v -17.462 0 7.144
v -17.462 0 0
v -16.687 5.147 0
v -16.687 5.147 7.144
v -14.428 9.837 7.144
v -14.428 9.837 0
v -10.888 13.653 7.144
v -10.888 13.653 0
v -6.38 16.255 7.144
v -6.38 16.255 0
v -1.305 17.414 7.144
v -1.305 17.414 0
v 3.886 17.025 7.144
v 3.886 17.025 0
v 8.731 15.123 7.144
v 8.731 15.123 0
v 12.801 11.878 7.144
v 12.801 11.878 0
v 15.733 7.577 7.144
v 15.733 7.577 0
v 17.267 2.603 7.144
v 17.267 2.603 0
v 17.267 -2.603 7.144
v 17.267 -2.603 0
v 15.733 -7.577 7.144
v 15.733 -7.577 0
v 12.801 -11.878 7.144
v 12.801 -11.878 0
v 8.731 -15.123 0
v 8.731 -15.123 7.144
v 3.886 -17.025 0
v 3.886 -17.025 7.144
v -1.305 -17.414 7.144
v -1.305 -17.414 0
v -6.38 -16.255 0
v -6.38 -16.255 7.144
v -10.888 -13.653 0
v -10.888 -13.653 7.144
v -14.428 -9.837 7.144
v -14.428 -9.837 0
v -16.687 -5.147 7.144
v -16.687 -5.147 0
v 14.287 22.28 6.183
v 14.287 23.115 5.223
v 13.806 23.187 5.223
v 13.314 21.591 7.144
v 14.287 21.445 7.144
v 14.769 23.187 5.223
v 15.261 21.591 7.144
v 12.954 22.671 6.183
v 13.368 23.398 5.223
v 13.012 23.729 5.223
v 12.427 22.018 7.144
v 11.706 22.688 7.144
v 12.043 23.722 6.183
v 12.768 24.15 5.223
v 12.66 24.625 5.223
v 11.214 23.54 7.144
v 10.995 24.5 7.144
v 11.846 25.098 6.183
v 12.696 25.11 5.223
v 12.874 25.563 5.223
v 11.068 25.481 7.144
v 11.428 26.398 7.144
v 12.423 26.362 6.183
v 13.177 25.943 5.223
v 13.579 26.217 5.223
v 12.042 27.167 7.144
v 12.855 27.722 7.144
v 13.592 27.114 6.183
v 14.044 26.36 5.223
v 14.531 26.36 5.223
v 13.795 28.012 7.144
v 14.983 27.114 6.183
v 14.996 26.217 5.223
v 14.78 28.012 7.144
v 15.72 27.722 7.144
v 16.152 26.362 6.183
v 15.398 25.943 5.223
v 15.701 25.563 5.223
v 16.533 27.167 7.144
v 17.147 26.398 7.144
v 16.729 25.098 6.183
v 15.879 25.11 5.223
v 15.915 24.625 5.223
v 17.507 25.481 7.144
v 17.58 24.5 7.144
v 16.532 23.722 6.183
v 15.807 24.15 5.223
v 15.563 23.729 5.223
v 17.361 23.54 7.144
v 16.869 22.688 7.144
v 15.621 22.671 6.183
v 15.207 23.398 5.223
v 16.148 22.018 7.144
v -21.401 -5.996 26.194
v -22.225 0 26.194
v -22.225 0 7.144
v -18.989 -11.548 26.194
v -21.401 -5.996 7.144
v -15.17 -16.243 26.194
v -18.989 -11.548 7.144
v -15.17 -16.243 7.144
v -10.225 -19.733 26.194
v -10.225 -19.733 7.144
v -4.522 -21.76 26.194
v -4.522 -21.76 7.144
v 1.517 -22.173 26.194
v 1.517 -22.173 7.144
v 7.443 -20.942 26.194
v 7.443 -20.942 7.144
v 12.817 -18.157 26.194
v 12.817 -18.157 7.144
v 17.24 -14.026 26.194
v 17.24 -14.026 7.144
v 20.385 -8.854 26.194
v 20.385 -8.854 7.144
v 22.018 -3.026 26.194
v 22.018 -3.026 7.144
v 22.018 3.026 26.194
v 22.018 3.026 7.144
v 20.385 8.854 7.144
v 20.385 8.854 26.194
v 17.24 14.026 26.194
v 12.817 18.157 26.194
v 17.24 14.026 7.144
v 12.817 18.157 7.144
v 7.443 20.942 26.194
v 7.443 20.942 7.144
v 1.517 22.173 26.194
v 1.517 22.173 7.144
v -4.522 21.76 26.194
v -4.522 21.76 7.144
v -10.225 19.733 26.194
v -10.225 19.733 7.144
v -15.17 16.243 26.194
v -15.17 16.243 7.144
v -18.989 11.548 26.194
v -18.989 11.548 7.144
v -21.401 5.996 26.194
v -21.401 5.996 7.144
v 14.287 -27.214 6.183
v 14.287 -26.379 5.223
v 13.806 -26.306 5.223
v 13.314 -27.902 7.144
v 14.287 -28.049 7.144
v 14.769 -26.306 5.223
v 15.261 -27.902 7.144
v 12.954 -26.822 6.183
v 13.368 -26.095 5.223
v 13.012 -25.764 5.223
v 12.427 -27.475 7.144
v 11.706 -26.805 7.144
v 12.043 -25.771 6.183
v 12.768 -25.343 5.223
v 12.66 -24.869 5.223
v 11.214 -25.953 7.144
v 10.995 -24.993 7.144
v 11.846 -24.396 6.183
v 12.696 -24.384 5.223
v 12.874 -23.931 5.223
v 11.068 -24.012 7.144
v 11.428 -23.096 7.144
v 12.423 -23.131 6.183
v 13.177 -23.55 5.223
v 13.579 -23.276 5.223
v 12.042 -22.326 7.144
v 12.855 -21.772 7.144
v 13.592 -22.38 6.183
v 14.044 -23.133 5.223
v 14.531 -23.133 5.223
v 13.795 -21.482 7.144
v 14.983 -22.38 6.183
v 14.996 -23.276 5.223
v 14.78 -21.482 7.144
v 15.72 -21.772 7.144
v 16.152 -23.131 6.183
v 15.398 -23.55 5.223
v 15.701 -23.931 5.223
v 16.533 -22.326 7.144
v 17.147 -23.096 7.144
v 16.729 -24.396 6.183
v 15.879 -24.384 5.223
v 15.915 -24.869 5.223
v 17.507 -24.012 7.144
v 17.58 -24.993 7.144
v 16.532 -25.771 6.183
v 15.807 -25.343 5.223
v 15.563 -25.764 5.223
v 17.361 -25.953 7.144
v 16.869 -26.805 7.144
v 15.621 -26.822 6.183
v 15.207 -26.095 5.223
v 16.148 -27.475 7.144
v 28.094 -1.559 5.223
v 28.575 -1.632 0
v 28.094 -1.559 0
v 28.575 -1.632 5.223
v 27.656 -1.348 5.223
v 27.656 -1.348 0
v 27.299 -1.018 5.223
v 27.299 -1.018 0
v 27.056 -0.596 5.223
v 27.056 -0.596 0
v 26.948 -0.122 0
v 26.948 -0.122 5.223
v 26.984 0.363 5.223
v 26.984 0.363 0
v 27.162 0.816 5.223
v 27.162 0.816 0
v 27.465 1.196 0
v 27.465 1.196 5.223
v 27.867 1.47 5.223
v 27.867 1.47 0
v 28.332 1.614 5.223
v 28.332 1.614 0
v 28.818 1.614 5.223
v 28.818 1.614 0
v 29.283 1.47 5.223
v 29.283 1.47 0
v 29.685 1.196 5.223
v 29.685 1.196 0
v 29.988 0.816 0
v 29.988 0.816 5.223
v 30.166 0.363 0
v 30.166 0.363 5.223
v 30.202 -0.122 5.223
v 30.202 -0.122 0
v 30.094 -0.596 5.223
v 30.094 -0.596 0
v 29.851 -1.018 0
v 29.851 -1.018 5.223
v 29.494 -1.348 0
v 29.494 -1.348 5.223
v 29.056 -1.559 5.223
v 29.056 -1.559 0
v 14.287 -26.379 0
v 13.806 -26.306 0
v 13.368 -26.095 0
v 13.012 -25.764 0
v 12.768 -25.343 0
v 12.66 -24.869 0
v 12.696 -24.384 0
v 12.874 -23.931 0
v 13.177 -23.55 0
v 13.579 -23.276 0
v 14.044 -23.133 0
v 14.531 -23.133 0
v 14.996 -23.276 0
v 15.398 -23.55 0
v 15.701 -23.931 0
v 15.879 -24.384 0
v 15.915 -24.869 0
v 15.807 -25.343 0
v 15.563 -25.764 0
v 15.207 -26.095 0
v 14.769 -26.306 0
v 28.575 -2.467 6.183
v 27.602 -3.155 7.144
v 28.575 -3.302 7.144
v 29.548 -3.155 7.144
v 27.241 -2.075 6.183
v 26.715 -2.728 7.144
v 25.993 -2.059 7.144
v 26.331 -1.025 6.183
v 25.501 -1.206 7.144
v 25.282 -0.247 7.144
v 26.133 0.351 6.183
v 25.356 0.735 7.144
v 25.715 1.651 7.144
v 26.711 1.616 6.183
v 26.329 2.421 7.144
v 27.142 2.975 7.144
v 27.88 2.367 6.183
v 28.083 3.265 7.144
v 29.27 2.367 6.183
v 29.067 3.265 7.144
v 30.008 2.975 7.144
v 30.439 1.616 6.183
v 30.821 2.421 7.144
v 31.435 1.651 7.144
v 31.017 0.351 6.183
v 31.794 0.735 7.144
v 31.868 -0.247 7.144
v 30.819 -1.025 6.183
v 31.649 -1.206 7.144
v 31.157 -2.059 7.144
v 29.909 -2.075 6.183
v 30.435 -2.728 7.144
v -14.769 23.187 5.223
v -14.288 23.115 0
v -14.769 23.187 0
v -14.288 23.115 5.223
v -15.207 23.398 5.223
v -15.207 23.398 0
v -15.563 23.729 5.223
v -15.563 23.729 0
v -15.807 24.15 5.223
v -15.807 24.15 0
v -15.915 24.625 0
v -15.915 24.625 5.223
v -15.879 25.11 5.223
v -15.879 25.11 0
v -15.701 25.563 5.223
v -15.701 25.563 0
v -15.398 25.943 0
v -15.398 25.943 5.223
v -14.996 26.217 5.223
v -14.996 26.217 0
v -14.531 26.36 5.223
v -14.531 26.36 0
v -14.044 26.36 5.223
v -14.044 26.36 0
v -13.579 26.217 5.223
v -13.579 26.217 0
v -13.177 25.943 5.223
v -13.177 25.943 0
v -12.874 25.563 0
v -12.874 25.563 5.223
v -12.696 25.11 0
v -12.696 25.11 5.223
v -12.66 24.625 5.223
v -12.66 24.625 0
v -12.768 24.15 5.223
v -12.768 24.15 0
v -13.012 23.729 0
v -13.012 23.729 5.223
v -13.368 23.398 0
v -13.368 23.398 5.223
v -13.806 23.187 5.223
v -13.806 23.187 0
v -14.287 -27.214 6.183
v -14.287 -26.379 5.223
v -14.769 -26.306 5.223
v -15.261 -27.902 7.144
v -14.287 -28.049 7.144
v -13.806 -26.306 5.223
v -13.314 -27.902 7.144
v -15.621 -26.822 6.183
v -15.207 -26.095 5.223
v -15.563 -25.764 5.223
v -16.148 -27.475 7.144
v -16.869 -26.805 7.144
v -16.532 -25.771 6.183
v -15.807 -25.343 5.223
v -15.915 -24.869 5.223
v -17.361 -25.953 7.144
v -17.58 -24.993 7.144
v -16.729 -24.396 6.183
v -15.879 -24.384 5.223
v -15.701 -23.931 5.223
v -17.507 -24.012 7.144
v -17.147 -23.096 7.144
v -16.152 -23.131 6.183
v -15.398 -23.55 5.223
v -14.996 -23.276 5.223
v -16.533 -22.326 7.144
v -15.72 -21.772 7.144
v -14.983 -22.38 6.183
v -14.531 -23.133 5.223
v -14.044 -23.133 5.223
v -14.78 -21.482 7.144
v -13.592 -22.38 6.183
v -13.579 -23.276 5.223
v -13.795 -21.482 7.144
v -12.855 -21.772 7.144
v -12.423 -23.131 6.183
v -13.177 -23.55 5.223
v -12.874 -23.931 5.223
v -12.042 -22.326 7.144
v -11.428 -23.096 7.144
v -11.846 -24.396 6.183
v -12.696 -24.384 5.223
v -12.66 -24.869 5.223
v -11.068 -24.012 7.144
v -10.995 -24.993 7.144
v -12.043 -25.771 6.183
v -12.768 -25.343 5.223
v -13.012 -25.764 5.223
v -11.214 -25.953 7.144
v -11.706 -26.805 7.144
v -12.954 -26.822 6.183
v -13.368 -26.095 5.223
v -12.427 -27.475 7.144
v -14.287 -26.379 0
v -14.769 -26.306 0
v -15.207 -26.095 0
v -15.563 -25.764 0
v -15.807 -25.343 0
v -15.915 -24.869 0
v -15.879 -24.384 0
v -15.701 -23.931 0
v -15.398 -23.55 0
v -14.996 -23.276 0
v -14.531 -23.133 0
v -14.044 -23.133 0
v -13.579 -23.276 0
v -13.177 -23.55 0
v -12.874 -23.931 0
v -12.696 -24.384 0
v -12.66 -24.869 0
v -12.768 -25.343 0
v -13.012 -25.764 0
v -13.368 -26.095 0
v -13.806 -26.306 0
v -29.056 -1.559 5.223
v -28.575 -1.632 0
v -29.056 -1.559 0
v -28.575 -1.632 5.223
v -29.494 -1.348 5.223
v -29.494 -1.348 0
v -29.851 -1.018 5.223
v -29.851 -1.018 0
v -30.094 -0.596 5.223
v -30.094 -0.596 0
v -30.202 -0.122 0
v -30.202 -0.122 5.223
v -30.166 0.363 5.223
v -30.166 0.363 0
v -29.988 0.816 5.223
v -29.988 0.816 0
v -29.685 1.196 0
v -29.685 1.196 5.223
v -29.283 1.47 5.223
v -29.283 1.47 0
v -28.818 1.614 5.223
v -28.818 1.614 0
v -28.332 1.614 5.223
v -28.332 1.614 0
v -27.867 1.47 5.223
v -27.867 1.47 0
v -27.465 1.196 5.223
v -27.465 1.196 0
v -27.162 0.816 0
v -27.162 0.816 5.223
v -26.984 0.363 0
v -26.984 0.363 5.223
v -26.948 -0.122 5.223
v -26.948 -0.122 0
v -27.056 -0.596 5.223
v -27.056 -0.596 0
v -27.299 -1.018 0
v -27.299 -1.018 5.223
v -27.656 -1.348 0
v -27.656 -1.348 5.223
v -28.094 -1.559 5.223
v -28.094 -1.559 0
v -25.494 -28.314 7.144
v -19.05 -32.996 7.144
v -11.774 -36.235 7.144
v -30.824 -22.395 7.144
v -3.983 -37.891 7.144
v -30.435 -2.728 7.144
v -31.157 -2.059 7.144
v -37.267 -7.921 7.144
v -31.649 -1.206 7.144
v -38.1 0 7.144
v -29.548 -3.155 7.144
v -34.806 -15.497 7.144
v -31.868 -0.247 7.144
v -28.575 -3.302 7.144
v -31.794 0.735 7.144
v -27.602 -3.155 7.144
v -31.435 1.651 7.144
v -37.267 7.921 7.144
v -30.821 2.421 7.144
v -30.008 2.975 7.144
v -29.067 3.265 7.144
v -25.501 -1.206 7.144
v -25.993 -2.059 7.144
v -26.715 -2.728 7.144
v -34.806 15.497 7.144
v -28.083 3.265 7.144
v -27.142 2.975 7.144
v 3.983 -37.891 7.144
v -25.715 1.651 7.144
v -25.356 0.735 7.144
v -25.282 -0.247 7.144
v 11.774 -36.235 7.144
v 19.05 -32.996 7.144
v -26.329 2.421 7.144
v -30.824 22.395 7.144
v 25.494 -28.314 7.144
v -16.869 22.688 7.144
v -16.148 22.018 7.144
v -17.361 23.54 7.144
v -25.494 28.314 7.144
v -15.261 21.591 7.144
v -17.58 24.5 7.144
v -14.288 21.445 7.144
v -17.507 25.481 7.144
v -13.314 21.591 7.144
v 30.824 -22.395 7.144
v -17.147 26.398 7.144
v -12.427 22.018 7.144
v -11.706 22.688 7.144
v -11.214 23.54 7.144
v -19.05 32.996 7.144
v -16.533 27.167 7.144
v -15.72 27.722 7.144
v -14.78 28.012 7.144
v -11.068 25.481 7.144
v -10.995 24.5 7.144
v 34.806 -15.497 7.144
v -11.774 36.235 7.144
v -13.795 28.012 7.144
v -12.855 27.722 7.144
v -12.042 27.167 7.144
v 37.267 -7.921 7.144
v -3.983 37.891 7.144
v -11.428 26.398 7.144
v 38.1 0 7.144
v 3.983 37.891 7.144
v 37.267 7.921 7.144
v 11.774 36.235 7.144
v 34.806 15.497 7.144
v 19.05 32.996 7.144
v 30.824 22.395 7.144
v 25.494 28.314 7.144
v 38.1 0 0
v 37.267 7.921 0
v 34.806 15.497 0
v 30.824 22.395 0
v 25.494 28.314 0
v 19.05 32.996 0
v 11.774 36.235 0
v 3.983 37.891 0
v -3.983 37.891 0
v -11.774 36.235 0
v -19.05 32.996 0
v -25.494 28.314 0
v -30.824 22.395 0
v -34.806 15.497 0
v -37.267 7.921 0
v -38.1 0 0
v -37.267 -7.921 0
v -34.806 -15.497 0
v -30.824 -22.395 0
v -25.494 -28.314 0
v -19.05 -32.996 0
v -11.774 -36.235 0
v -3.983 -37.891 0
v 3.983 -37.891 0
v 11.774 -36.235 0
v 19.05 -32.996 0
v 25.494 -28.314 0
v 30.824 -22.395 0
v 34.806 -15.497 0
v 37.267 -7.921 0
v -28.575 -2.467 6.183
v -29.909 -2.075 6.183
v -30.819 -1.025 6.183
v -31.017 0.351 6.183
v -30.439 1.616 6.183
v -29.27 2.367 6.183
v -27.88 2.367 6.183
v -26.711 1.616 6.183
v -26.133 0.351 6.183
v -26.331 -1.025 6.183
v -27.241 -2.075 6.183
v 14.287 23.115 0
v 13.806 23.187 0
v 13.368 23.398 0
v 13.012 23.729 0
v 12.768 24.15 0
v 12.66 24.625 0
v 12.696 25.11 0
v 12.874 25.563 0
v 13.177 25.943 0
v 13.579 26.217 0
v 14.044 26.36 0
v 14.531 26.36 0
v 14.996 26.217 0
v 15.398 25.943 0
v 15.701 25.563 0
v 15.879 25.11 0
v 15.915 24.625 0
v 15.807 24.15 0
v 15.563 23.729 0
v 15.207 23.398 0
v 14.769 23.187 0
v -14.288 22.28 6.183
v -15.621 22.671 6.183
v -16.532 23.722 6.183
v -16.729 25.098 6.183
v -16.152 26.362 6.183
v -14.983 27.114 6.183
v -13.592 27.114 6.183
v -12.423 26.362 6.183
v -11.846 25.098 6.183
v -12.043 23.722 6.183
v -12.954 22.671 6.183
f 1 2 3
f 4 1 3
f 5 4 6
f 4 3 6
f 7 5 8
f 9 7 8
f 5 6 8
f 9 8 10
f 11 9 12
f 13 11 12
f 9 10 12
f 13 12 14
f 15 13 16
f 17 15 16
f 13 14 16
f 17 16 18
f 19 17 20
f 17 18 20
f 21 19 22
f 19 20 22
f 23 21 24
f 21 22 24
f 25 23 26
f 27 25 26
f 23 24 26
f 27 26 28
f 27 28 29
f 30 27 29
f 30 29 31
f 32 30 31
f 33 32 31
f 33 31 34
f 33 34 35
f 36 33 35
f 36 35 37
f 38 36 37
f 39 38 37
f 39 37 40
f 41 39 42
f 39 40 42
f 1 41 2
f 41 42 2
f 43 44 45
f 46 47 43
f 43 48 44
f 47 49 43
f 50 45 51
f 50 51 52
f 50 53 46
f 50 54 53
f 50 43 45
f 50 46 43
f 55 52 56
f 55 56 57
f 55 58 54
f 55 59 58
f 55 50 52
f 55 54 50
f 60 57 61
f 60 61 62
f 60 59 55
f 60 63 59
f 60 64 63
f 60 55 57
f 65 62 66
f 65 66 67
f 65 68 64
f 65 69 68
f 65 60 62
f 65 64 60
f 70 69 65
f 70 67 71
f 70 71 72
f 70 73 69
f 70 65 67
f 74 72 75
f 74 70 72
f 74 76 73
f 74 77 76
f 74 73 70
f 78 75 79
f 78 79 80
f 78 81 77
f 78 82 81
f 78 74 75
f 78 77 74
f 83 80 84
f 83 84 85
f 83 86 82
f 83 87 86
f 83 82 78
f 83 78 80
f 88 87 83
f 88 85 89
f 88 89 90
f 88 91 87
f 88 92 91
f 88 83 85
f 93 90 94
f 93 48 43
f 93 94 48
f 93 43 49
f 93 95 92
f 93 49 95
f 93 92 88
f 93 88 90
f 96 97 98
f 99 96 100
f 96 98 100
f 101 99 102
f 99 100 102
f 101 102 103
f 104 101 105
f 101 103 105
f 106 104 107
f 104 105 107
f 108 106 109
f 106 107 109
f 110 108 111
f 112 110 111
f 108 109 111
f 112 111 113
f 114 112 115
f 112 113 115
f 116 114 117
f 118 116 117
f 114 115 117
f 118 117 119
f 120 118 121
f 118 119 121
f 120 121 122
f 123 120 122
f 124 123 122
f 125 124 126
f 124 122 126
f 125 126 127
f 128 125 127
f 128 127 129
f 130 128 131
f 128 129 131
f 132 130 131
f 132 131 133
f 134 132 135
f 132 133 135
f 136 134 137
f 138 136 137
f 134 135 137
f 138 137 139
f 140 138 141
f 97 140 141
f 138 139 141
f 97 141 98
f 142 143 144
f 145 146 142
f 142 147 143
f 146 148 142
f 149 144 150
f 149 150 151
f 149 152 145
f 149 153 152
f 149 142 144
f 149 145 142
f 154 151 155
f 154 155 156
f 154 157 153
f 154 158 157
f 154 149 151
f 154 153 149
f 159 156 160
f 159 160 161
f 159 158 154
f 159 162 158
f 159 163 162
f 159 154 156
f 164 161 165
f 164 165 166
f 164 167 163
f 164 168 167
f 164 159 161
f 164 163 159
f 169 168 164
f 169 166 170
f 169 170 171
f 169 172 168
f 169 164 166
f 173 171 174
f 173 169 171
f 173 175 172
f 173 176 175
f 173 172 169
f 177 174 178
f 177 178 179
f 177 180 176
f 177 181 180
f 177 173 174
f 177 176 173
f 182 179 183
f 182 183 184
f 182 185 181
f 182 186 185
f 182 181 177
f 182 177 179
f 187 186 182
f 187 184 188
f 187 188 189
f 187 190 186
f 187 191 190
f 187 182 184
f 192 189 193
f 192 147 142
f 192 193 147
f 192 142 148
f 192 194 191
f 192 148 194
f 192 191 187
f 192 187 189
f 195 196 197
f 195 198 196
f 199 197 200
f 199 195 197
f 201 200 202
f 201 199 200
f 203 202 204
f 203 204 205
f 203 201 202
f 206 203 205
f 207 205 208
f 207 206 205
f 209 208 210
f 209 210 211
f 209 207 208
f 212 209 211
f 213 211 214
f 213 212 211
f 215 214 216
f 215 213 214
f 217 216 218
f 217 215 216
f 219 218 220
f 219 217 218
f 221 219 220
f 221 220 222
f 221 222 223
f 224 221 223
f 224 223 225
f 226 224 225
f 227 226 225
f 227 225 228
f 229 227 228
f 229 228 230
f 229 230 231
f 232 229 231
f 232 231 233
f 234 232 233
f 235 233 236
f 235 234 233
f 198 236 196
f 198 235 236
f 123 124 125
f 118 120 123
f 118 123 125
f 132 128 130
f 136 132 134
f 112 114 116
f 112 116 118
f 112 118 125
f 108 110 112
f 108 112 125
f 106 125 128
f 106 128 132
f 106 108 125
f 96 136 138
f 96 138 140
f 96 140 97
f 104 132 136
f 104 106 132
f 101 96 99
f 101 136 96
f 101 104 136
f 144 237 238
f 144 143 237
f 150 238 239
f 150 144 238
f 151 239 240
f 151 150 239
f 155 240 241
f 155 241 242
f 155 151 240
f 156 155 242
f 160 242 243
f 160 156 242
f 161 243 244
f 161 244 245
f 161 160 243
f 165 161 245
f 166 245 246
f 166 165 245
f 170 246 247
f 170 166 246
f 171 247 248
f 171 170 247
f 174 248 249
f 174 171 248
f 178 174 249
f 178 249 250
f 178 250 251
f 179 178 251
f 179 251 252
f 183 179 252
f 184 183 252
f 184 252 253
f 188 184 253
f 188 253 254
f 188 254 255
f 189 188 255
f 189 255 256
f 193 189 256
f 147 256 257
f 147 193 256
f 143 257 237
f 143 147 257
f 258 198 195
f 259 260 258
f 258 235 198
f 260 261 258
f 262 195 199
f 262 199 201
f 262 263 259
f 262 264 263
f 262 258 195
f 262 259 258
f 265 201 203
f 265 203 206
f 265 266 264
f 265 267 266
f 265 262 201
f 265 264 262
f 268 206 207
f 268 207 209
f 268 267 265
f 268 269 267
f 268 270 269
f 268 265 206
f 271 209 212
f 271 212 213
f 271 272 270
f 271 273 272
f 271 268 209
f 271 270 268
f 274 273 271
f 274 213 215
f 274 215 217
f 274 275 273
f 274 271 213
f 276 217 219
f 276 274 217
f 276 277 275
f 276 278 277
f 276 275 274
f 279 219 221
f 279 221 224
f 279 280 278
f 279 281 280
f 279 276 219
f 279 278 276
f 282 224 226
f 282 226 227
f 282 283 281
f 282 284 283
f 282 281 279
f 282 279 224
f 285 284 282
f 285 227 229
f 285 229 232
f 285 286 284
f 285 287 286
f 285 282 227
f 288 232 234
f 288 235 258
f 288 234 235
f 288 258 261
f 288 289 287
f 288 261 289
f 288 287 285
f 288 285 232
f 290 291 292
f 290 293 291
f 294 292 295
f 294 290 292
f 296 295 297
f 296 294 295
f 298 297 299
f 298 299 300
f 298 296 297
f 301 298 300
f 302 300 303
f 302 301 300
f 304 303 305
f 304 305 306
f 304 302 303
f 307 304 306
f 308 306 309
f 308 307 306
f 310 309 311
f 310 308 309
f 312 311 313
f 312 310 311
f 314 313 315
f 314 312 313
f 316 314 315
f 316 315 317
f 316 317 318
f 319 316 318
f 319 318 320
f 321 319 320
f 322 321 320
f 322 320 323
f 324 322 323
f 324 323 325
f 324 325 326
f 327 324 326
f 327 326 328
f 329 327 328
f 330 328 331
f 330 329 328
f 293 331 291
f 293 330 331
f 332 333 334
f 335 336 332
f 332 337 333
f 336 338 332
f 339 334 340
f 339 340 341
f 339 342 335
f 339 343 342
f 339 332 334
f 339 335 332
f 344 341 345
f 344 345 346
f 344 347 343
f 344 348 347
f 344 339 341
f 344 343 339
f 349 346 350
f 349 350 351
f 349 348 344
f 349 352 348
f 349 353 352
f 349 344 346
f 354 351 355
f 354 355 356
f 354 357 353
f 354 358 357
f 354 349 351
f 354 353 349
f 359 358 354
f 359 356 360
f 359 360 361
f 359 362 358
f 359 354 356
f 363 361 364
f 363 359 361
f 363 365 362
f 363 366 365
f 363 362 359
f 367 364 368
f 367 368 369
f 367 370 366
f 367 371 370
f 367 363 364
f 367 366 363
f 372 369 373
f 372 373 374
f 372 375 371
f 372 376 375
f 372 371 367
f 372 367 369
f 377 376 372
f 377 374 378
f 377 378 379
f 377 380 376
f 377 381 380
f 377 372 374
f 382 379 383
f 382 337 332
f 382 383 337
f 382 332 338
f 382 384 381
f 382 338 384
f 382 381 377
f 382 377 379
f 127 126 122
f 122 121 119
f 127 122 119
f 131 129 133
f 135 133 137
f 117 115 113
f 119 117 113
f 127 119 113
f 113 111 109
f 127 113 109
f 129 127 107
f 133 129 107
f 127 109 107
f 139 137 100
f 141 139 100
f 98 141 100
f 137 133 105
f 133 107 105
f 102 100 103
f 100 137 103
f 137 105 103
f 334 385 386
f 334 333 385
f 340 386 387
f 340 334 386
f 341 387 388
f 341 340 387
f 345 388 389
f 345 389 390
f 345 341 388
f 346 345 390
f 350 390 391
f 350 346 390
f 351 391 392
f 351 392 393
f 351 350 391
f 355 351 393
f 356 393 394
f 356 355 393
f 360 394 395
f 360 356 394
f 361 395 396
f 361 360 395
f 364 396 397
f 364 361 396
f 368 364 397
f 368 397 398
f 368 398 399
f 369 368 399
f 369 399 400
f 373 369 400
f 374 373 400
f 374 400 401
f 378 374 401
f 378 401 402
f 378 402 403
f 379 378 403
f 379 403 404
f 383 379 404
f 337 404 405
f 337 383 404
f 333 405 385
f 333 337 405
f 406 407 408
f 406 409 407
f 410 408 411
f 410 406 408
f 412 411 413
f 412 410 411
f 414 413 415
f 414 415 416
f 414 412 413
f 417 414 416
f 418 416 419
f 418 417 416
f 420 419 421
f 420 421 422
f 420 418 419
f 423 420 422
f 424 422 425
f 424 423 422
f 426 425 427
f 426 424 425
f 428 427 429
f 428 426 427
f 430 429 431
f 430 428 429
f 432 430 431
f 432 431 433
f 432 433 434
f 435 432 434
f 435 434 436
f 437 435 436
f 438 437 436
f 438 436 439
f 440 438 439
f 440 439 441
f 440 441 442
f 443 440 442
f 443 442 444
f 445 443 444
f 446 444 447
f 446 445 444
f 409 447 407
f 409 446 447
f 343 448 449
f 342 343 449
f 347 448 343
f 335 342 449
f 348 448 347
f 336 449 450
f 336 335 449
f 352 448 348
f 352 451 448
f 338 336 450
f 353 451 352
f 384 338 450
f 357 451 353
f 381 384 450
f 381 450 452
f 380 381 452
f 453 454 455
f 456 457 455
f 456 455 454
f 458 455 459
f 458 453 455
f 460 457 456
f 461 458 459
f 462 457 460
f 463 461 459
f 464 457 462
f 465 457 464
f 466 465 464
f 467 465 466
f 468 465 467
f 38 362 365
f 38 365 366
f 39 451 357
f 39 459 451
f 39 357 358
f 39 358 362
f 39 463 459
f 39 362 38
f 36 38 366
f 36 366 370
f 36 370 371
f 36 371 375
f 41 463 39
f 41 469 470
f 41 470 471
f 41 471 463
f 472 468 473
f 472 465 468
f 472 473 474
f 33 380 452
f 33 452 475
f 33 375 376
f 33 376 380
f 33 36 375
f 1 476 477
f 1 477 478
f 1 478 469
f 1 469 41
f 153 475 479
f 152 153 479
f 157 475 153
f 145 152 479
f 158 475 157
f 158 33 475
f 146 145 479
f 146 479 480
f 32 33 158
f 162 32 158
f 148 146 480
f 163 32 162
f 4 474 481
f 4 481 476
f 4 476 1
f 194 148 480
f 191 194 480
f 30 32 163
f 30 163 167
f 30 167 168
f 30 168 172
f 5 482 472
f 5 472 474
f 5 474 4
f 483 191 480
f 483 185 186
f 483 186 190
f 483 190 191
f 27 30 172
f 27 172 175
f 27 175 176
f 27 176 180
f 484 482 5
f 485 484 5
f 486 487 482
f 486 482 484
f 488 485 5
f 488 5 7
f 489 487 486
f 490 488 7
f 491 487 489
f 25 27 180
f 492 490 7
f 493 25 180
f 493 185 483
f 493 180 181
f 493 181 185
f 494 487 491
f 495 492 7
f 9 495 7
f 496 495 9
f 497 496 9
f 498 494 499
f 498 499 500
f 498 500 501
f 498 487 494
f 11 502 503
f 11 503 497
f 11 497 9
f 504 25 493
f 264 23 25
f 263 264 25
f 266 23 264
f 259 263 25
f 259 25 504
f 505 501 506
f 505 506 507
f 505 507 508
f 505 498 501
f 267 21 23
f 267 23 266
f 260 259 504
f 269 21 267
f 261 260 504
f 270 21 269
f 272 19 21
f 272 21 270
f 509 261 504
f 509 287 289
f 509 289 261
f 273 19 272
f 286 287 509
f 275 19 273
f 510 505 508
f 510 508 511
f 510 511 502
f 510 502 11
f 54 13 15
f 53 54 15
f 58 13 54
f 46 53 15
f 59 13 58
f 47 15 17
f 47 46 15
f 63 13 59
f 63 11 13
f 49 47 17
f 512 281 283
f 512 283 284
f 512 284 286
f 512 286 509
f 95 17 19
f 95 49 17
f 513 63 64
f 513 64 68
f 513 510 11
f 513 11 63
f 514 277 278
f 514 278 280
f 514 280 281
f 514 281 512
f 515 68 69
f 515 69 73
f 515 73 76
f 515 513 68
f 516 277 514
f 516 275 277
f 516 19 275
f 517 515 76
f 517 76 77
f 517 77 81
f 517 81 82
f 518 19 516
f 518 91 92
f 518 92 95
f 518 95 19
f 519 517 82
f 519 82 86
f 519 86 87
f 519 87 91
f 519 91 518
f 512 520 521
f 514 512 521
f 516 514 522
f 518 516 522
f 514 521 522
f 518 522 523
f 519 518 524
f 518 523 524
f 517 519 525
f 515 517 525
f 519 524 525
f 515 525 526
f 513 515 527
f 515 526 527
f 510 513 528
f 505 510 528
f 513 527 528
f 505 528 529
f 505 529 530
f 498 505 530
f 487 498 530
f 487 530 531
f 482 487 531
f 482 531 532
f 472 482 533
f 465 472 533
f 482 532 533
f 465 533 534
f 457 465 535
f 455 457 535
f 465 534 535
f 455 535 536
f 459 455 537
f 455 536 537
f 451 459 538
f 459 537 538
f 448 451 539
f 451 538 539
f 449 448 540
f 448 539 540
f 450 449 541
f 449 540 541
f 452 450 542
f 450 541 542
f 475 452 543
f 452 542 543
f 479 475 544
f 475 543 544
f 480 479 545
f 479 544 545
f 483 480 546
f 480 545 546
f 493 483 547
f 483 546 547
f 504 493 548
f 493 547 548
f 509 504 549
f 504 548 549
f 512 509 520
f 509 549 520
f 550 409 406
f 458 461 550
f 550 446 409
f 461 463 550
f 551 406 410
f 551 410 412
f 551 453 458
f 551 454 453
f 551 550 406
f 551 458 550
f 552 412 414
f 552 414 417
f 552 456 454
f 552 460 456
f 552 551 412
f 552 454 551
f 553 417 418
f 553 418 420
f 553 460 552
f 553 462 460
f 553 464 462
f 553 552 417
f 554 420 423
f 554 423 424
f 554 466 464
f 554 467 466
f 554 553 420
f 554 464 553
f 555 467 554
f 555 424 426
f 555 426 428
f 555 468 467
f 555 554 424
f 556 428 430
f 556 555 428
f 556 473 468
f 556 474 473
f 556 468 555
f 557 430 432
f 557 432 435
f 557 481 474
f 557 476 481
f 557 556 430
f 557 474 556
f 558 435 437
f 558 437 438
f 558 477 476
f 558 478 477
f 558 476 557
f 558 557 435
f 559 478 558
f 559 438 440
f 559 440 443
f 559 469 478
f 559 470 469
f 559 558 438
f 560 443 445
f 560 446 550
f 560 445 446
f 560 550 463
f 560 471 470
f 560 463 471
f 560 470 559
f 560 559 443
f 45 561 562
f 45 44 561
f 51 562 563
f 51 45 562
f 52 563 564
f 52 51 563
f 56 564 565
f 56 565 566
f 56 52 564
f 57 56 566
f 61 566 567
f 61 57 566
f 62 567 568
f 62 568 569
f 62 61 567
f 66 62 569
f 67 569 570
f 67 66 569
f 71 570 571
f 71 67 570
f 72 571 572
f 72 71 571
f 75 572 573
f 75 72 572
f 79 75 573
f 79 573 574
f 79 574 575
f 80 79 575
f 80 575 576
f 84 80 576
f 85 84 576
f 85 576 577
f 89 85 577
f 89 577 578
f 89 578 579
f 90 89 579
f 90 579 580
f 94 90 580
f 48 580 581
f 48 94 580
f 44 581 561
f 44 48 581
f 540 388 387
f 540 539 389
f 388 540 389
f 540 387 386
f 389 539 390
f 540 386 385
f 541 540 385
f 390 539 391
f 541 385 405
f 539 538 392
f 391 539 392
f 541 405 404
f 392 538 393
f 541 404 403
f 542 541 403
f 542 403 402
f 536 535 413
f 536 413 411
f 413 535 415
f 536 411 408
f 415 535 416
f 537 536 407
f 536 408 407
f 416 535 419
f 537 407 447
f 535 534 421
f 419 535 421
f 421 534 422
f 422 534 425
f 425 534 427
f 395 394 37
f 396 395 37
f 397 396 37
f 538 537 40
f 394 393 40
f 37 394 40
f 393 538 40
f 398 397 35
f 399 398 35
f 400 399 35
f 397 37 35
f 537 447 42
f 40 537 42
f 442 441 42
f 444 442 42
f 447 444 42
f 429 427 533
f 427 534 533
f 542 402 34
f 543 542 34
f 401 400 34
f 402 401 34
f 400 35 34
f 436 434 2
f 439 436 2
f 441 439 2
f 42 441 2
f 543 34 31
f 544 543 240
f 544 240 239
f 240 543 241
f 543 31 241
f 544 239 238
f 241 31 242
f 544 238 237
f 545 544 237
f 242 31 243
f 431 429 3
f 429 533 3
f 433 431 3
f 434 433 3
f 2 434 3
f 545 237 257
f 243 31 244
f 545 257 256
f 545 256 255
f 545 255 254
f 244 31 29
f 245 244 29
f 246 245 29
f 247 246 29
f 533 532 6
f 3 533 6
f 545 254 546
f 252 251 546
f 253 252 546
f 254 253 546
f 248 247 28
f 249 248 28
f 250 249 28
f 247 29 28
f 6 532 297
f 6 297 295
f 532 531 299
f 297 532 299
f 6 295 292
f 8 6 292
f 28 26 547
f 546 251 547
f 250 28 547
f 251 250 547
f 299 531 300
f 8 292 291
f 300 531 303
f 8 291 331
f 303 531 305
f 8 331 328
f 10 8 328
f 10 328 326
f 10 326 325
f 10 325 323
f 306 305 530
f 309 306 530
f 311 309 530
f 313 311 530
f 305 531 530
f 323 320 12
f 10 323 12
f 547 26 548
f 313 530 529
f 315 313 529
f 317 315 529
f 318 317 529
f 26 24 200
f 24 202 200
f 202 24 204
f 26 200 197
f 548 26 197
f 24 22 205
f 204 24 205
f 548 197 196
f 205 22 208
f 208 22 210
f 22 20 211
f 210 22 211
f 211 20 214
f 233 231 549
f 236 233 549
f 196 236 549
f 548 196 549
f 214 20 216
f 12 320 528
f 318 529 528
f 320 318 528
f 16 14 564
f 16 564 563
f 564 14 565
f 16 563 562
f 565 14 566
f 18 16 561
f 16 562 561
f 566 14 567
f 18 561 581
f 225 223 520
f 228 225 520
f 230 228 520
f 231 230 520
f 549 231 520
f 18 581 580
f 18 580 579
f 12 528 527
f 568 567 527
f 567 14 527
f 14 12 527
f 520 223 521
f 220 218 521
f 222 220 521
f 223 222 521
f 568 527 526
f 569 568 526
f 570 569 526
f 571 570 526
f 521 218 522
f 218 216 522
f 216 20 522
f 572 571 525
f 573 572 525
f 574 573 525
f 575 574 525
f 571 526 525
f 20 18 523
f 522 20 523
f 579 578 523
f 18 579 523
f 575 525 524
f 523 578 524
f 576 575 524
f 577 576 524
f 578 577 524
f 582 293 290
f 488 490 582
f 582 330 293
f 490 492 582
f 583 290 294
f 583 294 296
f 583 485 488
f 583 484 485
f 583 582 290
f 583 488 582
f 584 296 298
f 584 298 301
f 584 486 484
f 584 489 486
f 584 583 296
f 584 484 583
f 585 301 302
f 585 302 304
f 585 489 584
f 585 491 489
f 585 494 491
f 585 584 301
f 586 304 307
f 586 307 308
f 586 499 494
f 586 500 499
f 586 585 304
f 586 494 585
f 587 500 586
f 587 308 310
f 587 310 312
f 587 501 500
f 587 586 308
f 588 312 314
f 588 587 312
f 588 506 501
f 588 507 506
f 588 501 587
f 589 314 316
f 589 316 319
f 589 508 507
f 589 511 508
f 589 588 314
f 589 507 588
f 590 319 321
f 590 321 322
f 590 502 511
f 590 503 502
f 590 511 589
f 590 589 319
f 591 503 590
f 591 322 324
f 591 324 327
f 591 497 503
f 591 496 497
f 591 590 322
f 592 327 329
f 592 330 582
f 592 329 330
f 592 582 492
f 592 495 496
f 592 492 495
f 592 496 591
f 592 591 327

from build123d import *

# Parameters (mm, degrees)
SKETCH1_R                                     = 38.1
BOSS_EXTRUDE1_DEPTH                           = 7.14375
SKETCH3_R                                     = 22.225
BOSS_EXTRUDE2_DEPTH                           = 19.05
CSK_FOR_4_FLAT_HEAD_MACHINE_SCREW1_AT_2_COUNT = 2
CSK_FOR_4_FLAT_HEAD_MACHINE_SCREW1_AT_2_PITCH = 28.575
CSK_FOR_4_FLAT_HEAD_MACHINE_SCREW1_AT_3_COUNT = 2
CSK_FOR_4_FLAT_HEAD_MACHINE_SCREW1_AT_3_PITCH = 49.493351826
CSK_FOR_4_FLAT_HEAD_MACHINE_SCREW1_AT_4_COUNT = 2
CSK_FOR_4_FLAT_HEAD_MACHINE_SCREW1_AT_4_PITCH = 57.15
CSK_FOR_4_FLAT_HEAD_MACHINE_SCREW1_AT_5_COUNT = 2
CSK_FOR_4_FLAT_HEAD_MACHINE_SCREW1_AT_5_PITCH = 49.493351826
CSK_FOR_4_FLAT_HEAD_MACHINE_SCREW1_AT_6_COUNT = 2
CSK_FOR_4_FLAT_HEAD_MACHINE_SCREW1_AT_6_PITCH = 28.575
SKETCH11_R                                    = 17.4625
CUT_EXTRUDE1_DEPTH                            = 7.14375


with BuildPart() as part:
    # Sketch1 → Boss-Extrude1 (new body)
    with BuildSketch(Plane.XY):
        Circle(SKETCH1_R)
    extrude(amount=BOSS_EXTRUDE1_DEPTH)

    # Sketch9 → CSK for #4 Flat Head Machine Screw1 (revolve, cut)
    with BuildSketch(Plane(origin=(-28.575, 0, 7.14375), x_dir=(0, -1, 0), z_dir=(1, 0, 0))):
        Polygon((0, 0), (0, 7.14375), (1.63195, 7.14375), (1.63195, 1.921172758), (3.302, 0), align=None)
    csk_for_4_flat_head_machine_screw1 = revolve(axis=Axis((-28.575, 0, 13.49375), (0, 0, -1)), mode=Mode.SUBTRACT)

    # CSK for #4 Flat Head Machine Screw1 at 2: CSK for #4 Flat Head Machine Screw1 ×2
    with Locations(*[Vector(0.4999999999999949, 0.8660254037844416, 0) * (i * CSK_FOR_4_FLAT_HEAD_MACHINE_SCREW1_AT_2_PITCH) for i in range(1, CSK_FOR_4_FLAT_HEAD_MACHINE_SCREW1_AT_2_COUNT)]):
        add(csk_for_4_flat_head_machine_screw1, mode=Mode.SUBTRACT)

    # CSK for #4 Flat Head Machine Screw1 at 3: CSK for #4 Flat Head Machine Screw1 ×2
    with Locations(*[Vector(0.8660254037844363, 0.5000000000000041, 0) * (i * CSK_FOR_4_FLAT_HEAD_MACHINE_SCREW1_AT_3_PITCH) for i in range(1, CSK_FOR_4_FLAT_HEAD_MACHINE_SCREW1_AT_3_COUNT)]):
        add(csk_for_4_flat_head_machine_screw1, mode=Mode.SUBTRACT)

    # CSK for #4 Flat Head Machine Screw1 at 4: CSK for #4 Flat Head Machine Screw1 ×2
    with Locations(*[(i * CSK_FOR_4_FLAT_HEAD_MACHINE_SCREW1_AT_4_PITCH, 0, 0) for i in range(1, CSK_FOR_4_FLAT_HEAD_MACHINE_SCREW1_AT_4_COUNT)]):
        add(csk_for_4_flat_head_machine_screw1, mode=Mode.SUBTRACT)

    # CSK for #4 Flat Head Machine Screw1 at 5: CSK for #4 Flat Head Machine Screw1 ×2
    with Locations(*[Vector(0.8660254037844434, -0.49999999999999195, 0) * (i * CSK_FOR_4_FLAT_HEAD_MACHINE_SCREW1_AT_5_PITCH) for i in range(1, CSK_FOR_4_FLAT_HEAD_MACHINE_SCREW1_AT_5_COUNT)]):
        add(csk_for_4_flat_head_machine_screw1, mode=Mode.SUBTRACT)

    # CSK for #4 Flat Head Machine Screw1 at 6: CSK for #4 Flat Head Machine Screw1 ×2
    with Locations(*[Vector(0.5000000000000072, -0.8660254037844345, 0) * (i * CSK_FOR_4_FLAT_HEAD_MACHINE_SCREW1_AT_6_PITCH) for i in range(1, CSK_FOR_4_FLAT_HEAD_MACHINE_SCREW1_AT_6_COUNT)]):
        add(csk_for_4_flat_head_machine_screw1, mode=Mode.SUBTRACT)

    # Sketch11 → Cut-Extrude1 (cut)
    with BuildSketch(Plane(origin=(0, 0, 0), x_dir=(-1, 0, 0), z_dir=(0, 0, -1))):
        Circle(SKETCH11_R)
    extrude(amount=-CUT_EXTRUDE1_DEPTH, mode=Mode.SUBTRACT)


with BuildPart() as body_2:
    # Sketch3 → Boss-Extrude2 (new body)
    with BuildSketch(Plane.XY.offset(7.14375)):
        with Locations(Location((0, 0, 0), (0, 0, 180))):
            Circle(SKETCH3_R)
    extrude(amount=BOSS_EXTRUDE2_DEPTH)


solid = Compound([part.part, body_2.part])
